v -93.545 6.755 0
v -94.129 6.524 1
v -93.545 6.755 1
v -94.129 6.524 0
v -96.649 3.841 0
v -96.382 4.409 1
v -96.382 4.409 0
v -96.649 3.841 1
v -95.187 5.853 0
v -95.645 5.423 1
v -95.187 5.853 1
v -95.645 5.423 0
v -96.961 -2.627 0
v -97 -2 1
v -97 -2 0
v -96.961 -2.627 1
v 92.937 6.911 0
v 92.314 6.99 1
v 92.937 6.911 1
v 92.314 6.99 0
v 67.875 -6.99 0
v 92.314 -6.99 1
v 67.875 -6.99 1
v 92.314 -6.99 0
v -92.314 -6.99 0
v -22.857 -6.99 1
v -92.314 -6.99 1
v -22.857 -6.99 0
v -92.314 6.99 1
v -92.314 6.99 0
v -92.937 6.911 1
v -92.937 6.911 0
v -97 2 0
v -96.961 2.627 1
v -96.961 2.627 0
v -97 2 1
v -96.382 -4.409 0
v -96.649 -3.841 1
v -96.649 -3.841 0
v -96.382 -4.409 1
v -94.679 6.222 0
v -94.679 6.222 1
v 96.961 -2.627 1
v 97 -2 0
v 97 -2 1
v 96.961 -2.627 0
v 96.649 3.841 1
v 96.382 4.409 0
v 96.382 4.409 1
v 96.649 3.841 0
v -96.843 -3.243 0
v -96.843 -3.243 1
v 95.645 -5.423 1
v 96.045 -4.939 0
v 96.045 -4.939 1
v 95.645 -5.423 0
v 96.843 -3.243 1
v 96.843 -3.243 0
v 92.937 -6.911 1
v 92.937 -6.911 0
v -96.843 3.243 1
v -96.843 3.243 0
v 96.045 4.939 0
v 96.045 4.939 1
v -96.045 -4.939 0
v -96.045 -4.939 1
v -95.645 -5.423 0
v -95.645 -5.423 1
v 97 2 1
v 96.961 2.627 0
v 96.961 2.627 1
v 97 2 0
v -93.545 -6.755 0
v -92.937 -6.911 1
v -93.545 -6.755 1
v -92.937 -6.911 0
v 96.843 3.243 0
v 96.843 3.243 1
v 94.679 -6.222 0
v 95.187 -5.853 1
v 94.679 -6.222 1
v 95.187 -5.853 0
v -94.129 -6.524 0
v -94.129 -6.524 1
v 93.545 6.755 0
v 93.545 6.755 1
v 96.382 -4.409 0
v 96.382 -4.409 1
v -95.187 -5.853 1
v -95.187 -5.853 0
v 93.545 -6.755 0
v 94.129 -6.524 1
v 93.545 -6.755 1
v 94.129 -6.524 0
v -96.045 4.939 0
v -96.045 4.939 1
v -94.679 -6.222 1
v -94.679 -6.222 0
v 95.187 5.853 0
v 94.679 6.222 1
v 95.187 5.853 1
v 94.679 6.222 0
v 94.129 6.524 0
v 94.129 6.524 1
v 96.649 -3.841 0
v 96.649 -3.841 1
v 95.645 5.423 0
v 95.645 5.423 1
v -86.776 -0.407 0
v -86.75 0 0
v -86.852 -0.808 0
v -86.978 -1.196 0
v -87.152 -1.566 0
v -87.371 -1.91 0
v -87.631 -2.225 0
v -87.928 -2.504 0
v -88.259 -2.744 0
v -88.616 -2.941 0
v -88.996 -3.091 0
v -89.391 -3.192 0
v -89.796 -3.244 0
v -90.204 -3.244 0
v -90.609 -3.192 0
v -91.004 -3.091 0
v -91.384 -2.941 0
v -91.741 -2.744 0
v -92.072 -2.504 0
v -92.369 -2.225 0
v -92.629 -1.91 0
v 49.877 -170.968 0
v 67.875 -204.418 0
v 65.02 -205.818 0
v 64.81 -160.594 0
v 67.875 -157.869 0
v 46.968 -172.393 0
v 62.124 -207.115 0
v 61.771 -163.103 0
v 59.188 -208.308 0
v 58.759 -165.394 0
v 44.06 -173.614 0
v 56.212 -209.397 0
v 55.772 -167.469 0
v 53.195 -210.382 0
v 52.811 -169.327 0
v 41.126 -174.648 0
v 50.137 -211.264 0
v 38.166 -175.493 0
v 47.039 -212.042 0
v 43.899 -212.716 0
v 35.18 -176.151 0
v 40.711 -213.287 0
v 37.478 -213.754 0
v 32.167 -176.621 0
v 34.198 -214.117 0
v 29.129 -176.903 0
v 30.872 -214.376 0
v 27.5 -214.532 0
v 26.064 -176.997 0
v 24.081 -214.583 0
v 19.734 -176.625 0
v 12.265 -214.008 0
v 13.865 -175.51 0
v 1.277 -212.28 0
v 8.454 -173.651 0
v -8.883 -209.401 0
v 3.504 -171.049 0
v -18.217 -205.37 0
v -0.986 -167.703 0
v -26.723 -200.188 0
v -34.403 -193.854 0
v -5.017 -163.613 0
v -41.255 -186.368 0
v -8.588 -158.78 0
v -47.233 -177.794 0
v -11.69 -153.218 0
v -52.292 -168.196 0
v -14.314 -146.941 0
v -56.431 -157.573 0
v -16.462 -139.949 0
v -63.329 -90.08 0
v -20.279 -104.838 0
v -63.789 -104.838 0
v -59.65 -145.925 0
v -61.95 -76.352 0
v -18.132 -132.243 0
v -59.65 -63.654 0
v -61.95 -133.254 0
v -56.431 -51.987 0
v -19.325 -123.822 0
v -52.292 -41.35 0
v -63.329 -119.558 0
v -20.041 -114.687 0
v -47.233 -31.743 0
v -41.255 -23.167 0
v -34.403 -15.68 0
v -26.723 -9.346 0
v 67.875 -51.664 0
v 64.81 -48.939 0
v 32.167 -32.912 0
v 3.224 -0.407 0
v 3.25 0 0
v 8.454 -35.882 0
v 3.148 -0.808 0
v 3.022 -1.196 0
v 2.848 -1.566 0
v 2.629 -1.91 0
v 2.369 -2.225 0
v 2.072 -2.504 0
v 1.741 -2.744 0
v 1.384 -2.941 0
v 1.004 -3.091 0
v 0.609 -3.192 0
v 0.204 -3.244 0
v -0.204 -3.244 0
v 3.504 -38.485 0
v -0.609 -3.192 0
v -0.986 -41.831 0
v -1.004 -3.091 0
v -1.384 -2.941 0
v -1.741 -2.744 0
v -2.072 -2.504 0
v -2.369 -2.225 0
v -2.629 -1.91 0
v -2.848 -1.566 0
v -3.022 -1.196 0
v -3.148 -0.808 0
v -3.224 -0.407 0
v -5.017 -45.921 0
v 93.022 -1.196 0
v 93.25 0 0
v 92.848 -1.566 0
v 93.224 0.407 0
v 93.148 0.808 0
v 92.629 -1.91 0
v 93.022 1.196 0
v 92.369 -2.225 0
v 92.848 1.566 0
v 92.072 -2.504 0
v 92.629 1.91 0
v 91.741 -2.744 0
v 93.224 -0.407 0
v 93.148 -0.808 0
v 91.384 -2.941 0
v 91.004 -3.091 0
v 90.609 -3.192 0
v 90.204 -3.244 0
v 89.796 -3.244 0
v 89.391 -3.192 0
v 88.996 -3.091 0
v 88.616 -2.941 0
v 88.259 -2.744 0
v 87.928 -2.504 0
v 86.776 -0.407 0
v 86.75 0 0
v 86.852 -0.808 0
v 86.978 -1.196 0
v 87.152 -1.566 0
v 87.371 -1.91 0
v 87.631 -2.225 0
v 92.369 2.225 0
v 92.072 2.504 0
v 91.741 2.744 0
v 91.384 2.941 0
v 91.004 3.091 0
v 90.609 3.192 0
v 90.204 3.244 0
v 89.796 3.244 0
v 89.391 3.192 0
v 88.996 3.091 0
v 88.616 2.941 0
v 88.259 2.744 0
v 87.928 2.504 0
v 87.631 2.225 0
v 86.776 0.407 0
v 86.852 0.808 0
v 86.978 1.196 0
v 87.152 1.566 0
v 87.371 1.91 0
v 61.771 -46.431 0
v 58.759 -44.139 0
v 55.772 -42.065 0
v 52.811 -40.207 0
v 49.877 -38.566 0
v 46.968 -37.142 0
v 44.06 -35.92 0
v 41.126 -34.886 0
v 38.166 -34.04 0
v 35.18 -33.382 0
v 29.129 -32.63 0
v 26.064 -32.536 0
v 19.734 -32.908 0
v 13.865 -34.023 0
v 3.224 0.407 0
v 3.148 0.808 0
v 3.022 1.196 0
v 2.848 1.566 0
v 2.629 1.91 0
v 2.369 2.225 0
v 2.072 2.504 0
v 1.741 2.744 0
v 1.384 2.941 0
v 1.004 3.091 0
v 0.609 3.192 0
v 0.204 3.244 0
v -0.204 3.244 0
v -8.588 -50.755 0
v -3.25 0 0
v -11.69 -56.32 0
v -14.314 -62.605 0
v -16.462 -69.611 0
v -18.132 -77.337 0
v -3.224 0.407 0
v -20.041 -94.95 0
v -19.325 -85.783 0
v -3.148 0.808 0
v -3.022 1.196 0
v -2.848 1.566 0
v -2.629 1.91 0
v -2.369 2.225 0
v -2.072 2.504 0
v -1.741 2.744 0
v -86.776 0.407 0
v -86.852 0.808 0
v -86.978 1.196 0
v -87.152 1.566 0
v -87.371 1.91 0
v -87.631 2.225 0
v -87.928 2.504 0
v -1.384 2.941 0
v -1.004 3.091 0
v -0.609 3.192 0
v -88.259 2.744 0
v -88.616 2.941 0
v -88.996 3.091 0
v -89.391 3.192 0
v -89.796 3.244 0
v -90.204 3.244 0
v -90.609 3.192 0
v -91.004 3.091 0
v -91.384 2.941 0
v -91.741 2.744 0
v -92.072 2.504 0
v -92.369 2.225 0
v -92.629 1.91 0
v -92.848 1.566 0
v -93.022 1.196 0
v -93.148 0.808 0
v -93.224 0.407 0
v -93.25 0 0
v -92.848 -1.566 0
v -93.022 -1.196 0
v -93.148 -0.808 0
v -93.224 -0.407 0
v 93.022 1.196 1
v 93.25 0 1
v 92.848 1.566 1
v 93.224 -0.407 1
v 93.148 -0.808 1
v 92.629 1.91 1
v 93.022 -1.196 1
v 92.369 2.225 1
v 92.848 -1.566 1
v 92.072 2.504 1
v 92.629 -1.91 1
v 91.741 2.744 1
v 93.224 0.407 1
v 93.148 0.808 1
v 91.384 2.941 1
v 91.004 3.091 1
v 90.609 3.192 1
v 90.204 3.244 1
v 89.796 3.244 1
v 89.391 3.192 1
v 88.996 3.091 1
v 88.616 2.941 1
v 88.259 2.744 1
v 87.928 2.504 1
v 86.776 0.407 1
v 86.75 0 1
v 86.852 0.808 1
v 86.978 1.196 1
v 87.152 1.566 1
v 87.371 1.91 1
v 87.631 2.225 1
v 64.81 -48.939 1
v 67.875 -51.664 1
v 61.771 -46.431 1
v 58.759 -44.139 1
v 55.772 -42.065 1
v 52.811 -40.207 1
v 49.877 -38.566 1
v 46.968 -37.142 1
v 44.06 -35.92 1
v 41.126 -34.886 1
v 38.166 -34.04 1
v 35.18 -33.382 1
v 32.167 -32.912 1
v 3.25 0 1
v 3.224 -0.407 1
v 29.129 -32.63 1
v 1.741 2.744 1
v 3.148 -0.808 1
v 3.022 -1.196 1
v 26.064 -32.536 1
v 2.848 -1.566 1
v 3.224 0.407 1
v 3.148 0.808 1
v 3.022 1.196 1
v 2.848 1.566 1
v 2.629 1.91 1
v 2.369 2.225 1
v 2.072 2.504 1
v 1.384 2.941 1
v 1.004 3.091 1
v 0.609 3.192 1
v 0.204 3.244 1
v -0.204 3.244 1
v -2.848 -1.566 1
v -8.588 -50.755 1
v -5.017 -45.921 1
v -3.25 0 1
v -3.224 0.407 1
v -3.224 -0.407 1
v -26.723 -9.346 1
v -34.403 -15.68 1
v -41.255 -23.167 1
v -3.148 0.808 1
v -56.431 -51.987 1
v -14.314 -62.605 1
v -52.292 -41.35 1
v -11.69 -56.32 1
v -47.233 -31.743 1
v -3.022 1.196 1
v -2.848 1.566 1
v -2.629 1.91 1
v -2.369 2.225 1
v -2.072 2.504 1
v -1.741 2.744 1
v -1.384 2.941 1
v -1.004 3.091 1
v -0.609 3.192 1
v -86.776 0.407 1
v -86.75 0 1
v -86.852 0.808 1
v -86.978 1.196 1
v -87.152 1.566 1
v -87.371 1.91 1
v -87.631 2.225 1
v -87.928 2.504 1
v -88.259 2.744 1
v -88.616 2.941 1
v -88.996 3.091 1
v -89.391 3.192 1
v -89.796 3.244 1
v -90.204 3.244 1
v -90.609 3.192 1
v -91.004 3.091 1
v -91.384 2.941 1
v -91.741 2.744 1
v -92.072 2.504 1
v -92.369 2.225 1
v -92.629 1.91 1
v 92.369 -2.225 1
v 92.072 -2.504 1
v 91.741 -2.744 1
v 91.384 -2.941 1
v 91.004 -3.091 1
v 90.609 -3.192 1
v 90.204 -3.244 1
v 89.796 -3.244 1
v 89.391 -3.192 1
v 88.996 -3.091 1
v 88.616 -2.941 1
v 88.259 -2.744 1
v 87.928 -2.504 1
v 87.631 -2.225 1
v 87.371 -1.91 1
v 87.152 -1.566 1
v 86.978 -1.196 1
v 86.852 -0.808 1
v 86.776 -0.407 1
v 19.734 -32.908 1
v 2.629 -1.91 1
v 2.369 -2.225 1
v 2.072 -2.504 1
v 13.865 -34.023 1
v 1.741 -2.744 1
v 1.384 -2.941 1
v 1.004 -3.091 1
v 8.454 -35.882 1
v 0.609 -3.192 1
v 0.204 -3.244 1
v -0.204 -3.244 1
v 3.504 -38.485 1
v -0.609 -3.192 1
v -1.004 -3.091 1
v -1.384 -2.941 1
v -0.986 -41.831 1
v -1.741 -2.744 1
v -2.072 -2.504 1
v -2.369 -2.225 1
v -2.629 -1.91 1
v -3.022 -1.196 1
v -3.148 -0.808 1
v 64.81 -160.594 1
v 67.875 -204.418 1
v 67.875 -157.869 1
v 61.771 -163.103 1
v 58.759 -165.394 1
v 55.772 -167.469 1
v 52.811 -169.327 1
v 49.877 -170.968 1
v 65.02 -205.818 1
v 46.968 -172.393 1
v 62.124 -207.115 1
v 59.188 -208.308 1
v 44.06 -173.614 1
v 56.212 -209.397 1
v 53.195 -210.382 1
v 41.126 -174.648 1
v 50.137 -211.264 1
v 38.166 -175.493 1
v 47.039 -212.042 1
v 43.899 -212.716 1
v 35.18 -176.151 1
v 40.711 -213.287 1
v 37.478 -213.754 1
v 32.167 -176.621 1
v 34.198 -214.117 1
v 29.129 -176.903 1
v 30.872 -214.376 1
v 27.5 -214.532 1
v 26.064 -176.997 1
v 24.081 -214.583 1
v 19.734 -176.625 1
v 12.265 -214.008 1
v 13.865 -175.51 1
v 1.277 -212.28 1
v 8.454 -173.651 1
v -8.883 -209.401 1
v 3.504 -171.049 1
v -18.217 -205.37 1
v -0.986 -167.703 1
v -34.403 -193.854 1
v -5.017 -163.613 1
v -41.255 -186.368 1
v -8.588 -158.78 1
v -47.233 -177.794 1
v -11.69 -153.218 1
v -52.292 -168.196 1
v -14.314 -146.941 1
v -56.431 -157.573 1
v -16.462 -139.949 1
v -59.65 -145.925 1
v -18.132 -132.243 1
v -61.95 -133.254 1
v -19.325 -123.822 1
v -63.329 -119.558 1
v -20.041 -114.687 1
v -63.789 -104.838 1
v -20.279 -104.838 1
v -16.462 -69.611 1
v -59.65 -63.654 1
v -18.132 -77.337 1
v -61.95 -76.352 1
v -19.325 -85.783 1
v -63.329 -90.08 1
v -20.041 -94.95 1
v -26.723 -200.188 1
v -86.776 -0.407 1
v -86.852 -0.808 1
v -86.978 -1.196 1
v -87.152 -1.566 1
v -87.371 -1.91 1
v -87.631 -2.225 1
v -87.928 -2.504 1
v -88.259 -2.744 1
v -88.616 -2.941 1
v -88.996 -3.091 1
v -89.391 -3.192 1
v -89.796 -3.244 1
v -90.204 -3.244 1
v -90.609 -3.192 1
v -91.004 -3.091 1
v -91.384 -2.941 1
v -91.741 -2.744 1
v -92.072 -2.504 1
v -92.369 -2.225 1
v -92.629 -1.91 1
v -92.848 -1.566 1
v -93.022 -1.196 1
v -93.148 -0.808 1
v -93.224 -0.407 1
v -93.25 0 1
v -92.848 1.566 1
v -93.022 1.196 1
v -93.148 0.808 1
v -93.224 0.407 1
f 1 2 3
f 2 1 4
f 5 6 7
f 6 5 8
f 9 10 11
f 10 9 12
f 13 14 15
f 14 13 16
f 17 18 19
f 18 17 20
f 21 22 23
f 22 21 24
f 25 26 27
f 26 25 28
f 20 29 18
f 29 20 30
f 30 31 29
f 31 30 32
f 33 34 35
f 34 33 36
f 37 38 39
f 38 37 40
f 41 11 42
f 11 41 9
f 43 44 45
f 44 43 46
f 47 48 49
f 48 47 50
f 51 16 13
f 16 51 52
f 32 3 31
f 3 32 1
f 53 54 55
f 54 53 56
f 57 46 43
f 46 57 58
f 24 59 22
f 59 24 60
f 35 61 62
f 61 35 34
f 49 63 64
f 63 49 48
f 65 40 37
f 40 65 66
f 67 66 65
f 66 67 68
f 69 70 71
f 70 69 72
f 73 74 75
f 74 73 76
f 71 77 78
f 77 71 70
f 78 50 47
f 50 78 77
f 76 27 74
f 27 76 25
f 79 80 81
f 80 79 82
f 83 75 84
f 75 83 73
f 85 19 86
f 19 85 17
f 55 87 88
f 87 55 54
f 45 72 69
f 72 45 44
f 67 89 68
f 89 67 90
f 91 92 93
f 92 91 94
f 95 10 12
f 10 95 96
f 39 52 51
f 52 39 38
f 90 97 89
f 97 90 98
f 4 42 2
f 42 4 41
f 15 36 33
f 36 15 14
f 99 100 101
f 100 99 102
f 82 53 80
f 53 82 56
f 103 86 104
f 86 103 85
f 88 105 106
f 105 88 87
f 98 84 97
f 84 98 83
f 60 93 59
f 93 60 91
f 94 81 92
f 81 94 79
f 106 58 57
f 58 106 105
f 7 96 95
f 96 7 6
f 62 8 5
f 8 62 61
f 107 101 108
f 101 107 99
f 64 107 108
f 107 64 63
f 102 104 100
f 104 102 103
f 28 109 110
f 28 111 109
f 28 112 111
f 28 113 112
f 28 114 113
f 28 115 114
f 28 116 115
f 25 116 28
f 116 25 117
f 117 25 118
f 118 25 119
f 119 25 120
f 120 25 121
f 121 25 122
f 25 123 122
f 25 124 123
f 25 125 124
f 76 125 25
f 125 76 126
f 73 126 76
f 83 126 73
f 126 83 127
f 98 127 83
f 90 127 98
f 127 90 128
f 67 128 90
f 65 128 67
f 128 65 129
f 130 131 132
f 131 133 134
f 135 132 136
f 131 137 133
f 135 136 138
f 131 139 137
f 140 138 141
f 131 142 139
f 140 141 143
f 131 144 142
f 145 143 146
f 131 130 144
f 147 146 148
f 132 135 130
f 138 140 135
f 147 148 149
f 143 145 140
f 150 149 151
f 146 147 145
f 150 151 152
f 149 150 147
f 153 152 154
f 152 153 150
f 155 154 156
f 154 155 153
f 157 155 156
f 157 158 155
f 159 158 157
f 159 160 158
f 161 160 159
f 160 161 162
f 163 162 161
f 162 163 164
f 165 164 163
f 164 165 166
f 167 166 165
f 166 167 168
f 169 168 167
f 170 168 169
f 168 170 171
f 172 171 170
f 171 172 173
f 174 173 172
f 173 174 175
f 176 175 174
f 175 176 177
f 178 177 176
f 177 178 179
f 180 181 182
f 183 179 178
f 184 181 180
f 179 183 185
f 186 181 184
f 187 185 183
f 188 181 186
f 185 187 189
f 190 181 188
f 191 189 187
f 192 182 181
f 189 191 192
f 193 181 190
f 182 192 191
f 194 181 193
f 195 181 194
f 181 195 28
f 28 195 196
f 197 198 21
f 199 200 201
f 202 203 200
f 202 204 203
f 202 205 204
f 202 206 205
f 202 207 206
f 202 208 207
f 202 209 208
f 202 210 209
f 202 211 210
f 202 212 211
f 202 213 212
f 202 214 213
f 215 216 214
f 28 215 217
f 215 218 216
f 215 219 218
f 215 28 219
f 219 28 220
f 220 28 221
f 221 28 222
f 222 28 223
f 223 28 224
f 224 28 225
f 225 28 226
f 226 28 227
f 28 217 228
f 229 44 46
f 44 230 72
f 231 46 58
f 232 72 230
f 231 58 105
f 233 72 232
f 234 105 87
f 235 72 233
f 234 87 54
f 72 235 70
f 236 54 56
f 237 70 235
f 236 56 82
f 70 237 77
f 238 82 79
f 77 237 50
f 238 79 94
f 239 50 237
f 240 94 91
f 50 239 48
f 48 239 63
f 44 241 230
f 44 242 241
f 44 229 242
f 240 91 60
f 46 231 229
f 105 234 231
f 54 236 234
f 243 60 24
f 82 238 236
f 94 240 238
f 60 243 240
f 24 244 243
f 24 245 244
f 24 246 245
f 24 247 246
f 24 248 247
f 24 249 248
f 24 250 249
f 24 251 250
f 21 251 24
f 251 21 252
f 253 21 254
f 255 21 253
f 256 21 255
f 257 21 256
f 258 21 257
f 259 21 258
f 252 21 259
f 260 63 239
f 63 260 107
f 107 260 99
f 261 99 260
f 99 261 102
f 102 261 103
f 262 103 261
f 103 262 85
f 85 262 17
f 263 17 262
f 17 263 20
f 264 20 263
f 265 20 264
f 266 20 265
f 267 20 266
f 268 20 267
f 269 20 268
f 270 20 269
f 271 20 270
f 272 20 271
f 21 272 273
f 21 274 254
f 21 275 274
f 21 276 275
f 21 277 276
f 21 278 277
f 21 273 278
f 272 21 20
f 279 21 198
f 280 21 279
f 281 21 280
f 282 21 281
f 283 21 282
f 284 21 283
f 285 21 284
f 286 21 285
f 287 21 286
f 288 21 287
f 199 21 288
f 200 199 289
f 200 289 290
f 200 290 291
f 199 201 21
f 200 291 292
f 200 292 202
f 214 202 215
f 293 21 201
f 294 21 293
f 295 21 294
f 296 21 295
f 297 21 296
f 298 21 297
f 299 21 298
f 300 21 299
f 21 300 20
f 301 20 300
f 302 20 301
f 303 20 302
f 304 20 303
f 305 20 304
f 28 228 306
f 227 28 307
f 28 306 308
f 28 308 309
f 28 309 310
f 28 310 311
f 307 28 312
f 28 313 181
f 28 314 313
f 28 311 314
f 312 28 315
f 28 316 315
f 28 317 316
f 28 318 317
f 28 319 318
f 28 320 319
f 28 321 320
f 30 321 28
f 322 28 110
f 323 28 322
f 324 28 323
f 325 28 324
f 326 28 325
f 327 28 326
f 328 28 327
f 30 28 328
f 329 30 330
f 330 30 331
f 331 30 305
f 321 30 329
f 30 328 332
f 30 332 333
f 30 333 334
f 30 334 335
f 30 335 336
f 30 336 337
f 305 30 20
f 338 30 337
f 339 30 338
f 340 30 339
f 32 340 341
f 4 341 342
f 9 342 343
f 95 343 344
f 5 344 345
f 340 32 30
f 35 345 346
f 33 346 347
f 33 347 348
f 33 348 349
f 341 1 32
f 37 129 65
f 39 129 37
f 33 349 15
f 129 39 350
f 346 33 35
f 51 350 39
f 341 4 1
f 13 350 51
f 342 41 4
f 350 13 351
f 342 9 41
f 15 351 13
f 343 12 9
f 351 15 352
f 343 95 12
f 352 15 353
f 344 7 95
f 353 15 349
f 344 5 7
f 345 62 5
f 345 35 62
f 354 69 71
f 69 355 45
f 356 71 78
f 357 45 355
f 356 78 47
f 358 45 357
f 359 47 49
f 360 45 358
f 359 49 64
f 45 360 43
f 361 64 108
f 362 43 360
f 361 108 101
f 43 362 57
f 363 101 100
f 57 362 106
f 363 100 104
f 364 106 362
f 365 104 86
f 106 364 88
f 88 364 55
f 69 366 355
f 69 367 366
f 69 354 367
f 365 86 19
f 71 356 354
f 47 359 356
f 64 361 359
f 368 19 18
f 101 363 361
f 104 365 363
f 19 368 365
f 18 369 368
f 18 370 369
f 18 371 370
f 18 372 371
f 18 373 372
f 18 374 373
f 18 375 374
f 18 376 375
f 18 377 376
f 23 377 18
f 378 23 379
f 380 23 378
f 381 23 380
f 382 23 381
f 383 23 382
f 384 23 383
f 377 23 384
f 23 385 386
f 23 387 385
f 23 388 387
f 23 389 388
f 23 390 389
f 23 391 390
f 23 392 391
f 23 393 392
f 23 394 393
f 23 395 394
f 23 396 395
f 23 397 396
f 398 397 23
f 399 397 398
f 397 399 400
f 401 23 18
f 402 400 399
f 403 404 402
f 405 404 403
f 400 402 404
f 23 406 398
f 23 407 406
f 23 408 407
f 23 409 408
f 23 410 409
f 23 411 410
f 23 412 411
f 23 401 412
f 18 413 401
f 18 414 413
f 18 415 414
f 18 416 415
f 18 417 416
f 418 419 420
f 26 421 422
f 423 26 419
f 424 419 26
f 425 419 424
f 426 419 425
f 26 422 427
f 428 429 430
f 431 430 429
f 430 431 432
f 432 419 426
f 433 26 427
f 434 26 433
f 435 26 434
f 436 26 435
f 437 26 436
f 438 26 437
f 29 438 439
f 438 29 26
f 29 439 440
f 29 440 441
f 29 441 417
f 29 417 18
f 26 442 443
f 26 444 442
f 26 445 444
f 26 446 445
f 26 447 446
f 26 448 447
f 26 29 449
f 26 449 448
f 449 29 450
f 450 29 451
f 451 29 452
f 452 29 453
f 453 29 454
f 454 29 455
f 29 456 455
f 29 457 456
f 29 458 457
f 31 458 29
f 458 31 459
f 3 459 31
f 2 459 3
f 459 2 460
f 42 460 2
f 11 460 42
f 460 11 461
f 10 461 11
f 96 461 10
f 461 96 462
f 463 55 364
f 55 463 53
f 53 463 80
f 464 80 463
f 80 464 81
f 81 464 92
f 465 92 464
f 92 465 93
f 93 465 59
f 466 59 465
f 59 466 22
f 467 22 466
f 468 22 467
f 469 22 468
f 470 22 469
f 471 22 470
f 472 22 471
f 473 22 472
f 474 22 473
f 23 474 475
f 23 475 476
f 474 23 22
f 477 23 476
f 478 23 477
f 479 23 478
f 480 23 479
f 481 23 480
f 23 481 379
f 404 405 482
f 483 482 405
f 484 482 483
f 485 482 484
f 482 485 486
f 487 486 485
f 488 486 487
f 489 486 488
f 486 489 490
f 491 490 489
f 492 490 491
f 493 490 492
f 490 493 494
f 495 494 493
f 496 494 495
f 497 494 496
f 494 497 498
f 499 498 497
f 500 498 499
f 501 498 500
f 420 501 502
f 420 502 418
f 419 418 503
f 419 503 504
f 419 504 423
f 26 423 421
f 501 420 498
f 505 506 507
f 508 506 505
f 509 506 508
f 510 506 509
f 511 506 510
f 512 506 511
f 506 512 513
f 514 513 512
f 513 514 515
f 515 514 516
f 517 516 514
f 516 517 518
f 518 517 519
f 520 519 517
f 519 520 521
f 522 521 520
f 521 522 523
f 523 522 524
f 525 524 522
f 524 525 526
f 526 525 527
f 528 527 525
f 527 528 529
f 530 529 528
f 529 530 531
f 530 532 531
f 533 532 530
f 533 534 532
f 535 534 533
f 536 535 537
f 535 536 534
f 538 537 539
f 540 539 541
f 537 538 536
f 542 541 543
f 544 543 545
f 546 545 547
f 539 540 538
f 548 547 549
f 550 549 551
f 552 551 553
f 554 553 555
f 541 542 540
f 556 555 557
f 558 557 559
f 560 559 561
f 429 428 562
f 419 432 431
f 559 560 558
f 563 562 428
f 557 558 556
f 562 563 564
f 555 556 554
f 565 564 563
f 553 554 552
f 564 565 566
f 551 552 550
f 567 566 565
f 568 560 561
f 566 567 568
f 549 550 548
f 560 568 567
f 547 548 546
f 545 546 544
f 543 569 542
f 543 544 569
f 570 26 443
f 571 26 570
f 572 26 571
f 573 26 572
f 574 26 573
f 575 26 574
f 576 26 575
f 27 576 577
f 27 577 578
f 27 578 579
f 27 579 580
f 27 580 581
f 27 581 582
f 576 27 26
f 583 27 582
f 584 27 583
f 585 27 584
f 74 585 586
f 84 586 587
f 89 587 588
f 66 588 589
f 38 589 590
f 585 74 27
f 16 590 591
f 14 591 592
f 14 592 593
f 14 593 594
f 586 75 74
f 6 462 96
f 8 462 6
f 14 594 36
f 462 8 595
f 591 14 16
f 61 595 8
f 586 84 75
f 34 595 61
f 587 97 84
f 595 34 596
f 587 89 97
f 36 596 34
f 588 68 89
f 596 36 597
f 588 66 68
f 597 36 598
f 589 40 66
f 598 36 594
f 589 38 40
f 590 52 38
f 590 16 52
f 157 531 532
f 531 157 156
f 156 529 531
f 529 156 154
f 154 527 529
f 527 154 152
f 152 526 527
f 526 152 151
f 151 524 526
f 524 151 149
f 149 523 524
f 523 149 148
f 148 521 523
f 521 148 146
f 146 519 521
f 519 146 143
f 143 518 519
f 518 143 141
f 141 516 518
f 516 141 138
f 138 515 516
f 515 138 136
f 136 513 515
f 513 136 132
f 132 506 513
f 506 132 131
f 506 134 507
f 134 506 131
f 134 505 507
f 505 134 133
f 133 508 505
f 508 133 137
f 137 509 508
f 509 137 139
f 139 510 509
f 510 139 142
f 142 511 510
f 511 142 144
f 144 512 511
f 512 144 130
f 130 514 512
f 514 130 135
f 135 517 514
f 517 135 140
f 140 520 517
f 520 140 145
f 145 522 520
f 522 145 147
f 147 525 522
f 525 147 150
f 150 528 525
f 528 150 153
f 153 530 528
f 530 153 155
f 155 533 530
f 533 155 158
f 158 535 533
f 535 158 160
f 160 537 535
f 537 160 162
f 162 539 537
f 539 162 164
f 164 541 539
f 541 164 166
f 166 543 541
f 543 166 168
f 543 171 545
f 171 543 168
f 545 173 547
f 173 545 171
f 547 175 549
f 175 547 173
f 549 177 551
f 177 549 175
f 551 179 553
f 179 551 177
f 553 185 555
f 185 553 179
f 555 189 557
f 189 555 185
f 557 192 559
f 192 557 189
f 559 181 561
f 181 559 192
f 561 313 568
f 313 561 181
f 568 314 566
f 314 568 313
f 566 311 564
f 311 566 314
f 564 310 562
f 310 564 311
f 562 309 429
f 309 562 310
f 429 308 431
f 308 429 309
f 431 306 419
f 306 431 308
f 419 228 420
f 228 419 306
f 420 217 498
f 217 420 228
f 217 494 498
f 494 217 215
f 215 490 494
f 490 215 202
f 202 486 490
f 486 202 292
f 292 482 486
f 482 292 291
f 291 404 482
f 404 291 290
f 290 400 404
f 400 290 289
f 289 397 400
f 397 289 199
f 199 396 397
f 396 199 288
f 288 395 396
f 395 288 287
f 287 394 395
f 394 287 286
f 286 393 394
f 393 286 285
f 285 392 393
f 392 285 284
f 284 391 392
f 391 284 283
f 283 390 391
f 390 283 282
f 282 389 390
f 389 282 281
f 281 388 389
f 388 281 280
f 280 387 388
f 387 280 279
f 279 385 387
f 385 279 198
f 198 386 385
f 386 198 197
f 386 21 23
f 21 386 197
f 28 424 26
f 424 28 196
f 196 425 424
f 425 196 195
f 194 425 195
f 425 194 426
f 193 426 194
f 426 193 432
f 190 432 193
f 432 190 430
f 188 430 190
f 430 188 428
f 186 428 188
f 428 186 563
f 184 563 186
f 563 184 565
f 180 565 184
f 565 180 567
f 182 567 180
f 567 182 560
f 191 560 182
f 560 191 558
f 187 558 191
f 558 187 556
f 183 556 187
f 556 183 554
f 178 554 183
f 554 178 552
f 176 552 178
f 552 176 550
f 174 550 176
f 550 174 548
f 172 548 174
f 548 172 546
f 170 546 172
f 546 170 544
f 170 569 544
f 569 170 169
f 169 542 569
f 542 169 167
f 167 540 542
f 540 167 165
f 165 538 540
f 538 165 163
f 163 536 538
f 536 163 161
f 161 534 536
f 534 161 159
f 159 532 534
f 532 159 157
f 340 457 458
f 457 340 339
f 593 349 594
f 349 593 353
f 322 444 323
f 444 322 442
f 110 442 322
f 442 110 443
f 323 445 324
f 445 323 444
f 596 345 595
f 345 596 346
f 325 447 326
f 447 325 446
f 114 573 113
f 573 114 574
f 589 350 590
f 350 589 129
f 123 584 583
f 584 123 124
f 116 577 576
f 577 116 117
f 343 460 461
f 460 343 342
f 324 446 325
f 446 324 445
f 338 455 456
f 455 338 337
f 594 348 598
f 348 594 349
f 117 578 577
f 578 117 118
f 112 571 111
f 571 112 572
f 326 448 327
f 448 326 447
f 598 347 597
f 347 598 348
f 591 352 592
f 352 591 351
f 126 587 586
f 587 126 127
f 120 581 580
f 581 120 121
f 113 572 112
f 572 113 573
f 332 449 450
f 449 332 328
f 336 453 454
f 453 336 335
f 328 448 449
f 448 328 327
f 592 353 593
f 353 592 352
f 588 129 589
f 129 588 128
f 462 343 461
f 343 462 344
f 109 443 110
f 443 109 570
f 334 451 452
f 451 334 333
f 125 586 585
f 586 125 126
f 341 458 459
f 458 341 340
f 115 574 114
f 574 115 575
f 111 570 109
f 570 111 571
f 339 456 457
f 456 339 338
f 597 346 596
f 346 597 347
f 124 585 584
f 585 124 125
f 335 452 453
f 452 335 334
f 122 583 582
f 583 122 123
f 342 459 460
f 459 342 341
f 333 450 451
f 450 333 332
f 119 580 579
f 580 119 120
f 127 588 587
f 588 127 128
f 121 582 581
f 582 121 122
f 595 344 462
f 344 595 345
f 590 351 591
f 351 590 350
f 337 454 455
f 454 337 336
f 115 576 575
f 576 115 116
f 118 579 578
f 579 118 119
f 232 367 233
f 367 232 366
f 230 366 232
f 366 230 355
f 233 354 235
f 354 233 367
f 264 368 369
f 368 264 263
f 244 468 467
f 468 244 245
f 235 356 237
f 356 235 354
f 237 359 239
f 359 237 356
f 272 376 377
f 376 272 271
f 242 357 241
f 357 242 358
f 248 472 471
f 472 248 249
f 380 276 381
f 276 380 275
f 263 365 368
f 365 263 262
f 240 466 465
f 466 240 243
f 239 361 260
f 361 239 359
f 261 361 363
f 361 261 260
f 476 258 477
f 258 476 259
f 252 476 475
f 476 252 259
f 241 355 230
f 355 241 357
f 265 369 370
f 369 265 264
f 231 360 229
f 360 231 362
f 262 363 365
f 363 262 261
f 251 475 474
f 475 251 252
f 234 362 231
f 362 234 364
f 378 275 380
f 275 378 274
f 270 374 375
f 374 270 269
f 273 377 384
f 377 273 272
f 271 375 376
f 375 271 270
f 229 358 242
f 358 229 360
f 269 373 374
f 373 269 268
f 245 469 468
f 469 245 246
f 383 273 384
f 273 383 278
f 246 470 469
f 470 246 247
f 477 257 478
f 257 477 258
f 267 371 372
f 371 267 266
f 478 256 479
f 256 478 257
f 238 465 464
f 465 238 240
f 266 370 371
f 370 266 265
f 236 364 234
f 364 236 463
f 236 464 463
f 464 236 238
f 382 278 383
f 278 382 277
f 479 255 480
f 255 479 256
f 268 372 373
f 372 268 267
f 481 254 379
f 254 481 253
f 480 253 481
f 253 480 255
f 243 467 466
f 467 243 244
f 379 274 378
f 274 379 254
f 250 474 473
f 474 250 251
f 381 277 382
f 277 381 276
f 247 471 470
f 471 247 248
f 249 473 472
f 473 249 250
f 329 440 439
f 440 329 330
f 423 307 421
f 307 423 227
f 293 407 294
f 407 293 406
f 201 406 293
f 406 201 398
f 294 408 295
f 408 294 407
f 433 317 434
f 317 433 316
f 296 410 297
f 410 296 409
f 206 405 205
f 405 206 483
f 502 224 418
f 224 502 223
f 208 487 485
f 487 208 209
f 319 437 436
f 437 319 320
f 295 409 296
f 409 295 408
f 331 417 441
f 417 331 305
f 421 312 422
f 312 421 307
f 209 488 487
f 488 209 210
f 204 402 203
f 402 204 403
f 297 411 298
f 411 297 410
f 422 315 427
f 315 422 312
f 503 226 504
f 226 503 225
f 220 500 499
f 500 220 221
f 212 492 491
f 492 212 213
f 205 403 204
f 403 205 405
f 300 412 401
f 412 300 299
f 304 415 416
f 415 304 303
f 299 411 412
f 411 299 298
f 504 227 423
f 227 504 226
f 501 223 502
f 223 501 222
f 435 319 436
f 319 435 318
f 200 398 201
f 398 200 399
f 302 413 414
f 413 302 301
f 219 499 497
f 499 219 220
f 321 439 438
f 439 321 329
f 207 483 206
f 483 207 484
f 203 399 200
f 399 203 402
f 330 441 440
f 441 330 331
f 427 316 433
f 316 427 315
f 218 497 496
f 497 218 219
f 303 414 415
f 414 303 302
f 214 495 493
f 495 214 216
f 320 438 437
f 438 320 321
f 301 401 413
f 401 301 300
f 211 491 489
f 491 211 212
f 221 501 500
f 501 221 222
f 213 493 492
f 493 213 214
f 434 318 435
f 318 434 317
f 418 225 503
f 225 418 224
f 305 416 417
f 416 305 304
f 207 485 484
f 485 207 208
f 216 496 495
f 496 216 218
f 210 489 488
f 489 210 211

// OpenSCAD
$fn = 50;


difference() {
	union() {
		translate(v = [0, 0, 0]) {
			rotate(a = [0, 0, 0]) {
				hull() {
					translate(v = [-92.0000000000, 2.0000000000, 0]) {
						rotate(a = [0, 0, 0]) {
							translate(v = [0, 0, 0]) {
								rotate(a = [0, 0, 0]) {
									cylinder(h = 1, r = 5);
								}
							}
						}
					}
					translate(v = [92.0000000000, 2.0000000000, 0]) {
						rotate(a = [0, 0, 0]) {
							translate(v = [0, 0, 0]) {
								rotate(a = [0, 0, 0]) {
									cylinder(h = 1, r = 5);
								}
							}
						}
					}
					translate(v = [-92.0000000000, -2.0000000000, 0]) {
						rotate(a = [0, 0, 0]) {
							translate(v = [0, 0, 0]) {
								rotate(a = [0, 0, 0]) {
									cylinder(h = 1, r = 5);
								}
							}
						}
					}
					translate(v = [92.0000000000, -2.0000000000, 0]) {
						rotate(a = [0, 0, 0]) {
							translate(v = [0, 0, 0]) {
								rotate(a = [0, 0, 0]) {
									cylinder(h = 1, r = 5);
								}
							}
						}
					}
				}
			}
		}
		translate(v = [0, 0, 0]) {
			rotate(a = [0, 0, 0]) {
				linear_extrude(height = 1) {
					text(font = "DejaVu Sans Mono:style=Bold", halign = "center", size = 209.0000000000, text = "C", valign = "top");
				}
			}
		}
	}
	union() {
		translate(v = [-90.0000000000, 0.0000000000, -125.0000000000]) {
			rotate(a = [0, 0, 0]) {
				cylinder(h = 250, r = 3.2500000000);
			}
		}
		translate(v = [90.0000000000, 0.0000000000, -125.0000000000]) {
			rotate(a = [0, 0, 0]) {
				cylinder(h = 250, r = 3.2500000000);
			}
		}
		translate(v = [90.0000000000, 0.0000000000, -125.0000000000]) {
			rotate(a = [0, 0, 0]) {
				cylinder(h = 250, r = 3.2500000000);
			}
		}
		translate(v = [0, 0, -125.0000000000]) {
			rotate(a = [0, 0, 0]) {
				cylinder(h = 250, r = 3.2500000000);
			}
		}
	}
}
